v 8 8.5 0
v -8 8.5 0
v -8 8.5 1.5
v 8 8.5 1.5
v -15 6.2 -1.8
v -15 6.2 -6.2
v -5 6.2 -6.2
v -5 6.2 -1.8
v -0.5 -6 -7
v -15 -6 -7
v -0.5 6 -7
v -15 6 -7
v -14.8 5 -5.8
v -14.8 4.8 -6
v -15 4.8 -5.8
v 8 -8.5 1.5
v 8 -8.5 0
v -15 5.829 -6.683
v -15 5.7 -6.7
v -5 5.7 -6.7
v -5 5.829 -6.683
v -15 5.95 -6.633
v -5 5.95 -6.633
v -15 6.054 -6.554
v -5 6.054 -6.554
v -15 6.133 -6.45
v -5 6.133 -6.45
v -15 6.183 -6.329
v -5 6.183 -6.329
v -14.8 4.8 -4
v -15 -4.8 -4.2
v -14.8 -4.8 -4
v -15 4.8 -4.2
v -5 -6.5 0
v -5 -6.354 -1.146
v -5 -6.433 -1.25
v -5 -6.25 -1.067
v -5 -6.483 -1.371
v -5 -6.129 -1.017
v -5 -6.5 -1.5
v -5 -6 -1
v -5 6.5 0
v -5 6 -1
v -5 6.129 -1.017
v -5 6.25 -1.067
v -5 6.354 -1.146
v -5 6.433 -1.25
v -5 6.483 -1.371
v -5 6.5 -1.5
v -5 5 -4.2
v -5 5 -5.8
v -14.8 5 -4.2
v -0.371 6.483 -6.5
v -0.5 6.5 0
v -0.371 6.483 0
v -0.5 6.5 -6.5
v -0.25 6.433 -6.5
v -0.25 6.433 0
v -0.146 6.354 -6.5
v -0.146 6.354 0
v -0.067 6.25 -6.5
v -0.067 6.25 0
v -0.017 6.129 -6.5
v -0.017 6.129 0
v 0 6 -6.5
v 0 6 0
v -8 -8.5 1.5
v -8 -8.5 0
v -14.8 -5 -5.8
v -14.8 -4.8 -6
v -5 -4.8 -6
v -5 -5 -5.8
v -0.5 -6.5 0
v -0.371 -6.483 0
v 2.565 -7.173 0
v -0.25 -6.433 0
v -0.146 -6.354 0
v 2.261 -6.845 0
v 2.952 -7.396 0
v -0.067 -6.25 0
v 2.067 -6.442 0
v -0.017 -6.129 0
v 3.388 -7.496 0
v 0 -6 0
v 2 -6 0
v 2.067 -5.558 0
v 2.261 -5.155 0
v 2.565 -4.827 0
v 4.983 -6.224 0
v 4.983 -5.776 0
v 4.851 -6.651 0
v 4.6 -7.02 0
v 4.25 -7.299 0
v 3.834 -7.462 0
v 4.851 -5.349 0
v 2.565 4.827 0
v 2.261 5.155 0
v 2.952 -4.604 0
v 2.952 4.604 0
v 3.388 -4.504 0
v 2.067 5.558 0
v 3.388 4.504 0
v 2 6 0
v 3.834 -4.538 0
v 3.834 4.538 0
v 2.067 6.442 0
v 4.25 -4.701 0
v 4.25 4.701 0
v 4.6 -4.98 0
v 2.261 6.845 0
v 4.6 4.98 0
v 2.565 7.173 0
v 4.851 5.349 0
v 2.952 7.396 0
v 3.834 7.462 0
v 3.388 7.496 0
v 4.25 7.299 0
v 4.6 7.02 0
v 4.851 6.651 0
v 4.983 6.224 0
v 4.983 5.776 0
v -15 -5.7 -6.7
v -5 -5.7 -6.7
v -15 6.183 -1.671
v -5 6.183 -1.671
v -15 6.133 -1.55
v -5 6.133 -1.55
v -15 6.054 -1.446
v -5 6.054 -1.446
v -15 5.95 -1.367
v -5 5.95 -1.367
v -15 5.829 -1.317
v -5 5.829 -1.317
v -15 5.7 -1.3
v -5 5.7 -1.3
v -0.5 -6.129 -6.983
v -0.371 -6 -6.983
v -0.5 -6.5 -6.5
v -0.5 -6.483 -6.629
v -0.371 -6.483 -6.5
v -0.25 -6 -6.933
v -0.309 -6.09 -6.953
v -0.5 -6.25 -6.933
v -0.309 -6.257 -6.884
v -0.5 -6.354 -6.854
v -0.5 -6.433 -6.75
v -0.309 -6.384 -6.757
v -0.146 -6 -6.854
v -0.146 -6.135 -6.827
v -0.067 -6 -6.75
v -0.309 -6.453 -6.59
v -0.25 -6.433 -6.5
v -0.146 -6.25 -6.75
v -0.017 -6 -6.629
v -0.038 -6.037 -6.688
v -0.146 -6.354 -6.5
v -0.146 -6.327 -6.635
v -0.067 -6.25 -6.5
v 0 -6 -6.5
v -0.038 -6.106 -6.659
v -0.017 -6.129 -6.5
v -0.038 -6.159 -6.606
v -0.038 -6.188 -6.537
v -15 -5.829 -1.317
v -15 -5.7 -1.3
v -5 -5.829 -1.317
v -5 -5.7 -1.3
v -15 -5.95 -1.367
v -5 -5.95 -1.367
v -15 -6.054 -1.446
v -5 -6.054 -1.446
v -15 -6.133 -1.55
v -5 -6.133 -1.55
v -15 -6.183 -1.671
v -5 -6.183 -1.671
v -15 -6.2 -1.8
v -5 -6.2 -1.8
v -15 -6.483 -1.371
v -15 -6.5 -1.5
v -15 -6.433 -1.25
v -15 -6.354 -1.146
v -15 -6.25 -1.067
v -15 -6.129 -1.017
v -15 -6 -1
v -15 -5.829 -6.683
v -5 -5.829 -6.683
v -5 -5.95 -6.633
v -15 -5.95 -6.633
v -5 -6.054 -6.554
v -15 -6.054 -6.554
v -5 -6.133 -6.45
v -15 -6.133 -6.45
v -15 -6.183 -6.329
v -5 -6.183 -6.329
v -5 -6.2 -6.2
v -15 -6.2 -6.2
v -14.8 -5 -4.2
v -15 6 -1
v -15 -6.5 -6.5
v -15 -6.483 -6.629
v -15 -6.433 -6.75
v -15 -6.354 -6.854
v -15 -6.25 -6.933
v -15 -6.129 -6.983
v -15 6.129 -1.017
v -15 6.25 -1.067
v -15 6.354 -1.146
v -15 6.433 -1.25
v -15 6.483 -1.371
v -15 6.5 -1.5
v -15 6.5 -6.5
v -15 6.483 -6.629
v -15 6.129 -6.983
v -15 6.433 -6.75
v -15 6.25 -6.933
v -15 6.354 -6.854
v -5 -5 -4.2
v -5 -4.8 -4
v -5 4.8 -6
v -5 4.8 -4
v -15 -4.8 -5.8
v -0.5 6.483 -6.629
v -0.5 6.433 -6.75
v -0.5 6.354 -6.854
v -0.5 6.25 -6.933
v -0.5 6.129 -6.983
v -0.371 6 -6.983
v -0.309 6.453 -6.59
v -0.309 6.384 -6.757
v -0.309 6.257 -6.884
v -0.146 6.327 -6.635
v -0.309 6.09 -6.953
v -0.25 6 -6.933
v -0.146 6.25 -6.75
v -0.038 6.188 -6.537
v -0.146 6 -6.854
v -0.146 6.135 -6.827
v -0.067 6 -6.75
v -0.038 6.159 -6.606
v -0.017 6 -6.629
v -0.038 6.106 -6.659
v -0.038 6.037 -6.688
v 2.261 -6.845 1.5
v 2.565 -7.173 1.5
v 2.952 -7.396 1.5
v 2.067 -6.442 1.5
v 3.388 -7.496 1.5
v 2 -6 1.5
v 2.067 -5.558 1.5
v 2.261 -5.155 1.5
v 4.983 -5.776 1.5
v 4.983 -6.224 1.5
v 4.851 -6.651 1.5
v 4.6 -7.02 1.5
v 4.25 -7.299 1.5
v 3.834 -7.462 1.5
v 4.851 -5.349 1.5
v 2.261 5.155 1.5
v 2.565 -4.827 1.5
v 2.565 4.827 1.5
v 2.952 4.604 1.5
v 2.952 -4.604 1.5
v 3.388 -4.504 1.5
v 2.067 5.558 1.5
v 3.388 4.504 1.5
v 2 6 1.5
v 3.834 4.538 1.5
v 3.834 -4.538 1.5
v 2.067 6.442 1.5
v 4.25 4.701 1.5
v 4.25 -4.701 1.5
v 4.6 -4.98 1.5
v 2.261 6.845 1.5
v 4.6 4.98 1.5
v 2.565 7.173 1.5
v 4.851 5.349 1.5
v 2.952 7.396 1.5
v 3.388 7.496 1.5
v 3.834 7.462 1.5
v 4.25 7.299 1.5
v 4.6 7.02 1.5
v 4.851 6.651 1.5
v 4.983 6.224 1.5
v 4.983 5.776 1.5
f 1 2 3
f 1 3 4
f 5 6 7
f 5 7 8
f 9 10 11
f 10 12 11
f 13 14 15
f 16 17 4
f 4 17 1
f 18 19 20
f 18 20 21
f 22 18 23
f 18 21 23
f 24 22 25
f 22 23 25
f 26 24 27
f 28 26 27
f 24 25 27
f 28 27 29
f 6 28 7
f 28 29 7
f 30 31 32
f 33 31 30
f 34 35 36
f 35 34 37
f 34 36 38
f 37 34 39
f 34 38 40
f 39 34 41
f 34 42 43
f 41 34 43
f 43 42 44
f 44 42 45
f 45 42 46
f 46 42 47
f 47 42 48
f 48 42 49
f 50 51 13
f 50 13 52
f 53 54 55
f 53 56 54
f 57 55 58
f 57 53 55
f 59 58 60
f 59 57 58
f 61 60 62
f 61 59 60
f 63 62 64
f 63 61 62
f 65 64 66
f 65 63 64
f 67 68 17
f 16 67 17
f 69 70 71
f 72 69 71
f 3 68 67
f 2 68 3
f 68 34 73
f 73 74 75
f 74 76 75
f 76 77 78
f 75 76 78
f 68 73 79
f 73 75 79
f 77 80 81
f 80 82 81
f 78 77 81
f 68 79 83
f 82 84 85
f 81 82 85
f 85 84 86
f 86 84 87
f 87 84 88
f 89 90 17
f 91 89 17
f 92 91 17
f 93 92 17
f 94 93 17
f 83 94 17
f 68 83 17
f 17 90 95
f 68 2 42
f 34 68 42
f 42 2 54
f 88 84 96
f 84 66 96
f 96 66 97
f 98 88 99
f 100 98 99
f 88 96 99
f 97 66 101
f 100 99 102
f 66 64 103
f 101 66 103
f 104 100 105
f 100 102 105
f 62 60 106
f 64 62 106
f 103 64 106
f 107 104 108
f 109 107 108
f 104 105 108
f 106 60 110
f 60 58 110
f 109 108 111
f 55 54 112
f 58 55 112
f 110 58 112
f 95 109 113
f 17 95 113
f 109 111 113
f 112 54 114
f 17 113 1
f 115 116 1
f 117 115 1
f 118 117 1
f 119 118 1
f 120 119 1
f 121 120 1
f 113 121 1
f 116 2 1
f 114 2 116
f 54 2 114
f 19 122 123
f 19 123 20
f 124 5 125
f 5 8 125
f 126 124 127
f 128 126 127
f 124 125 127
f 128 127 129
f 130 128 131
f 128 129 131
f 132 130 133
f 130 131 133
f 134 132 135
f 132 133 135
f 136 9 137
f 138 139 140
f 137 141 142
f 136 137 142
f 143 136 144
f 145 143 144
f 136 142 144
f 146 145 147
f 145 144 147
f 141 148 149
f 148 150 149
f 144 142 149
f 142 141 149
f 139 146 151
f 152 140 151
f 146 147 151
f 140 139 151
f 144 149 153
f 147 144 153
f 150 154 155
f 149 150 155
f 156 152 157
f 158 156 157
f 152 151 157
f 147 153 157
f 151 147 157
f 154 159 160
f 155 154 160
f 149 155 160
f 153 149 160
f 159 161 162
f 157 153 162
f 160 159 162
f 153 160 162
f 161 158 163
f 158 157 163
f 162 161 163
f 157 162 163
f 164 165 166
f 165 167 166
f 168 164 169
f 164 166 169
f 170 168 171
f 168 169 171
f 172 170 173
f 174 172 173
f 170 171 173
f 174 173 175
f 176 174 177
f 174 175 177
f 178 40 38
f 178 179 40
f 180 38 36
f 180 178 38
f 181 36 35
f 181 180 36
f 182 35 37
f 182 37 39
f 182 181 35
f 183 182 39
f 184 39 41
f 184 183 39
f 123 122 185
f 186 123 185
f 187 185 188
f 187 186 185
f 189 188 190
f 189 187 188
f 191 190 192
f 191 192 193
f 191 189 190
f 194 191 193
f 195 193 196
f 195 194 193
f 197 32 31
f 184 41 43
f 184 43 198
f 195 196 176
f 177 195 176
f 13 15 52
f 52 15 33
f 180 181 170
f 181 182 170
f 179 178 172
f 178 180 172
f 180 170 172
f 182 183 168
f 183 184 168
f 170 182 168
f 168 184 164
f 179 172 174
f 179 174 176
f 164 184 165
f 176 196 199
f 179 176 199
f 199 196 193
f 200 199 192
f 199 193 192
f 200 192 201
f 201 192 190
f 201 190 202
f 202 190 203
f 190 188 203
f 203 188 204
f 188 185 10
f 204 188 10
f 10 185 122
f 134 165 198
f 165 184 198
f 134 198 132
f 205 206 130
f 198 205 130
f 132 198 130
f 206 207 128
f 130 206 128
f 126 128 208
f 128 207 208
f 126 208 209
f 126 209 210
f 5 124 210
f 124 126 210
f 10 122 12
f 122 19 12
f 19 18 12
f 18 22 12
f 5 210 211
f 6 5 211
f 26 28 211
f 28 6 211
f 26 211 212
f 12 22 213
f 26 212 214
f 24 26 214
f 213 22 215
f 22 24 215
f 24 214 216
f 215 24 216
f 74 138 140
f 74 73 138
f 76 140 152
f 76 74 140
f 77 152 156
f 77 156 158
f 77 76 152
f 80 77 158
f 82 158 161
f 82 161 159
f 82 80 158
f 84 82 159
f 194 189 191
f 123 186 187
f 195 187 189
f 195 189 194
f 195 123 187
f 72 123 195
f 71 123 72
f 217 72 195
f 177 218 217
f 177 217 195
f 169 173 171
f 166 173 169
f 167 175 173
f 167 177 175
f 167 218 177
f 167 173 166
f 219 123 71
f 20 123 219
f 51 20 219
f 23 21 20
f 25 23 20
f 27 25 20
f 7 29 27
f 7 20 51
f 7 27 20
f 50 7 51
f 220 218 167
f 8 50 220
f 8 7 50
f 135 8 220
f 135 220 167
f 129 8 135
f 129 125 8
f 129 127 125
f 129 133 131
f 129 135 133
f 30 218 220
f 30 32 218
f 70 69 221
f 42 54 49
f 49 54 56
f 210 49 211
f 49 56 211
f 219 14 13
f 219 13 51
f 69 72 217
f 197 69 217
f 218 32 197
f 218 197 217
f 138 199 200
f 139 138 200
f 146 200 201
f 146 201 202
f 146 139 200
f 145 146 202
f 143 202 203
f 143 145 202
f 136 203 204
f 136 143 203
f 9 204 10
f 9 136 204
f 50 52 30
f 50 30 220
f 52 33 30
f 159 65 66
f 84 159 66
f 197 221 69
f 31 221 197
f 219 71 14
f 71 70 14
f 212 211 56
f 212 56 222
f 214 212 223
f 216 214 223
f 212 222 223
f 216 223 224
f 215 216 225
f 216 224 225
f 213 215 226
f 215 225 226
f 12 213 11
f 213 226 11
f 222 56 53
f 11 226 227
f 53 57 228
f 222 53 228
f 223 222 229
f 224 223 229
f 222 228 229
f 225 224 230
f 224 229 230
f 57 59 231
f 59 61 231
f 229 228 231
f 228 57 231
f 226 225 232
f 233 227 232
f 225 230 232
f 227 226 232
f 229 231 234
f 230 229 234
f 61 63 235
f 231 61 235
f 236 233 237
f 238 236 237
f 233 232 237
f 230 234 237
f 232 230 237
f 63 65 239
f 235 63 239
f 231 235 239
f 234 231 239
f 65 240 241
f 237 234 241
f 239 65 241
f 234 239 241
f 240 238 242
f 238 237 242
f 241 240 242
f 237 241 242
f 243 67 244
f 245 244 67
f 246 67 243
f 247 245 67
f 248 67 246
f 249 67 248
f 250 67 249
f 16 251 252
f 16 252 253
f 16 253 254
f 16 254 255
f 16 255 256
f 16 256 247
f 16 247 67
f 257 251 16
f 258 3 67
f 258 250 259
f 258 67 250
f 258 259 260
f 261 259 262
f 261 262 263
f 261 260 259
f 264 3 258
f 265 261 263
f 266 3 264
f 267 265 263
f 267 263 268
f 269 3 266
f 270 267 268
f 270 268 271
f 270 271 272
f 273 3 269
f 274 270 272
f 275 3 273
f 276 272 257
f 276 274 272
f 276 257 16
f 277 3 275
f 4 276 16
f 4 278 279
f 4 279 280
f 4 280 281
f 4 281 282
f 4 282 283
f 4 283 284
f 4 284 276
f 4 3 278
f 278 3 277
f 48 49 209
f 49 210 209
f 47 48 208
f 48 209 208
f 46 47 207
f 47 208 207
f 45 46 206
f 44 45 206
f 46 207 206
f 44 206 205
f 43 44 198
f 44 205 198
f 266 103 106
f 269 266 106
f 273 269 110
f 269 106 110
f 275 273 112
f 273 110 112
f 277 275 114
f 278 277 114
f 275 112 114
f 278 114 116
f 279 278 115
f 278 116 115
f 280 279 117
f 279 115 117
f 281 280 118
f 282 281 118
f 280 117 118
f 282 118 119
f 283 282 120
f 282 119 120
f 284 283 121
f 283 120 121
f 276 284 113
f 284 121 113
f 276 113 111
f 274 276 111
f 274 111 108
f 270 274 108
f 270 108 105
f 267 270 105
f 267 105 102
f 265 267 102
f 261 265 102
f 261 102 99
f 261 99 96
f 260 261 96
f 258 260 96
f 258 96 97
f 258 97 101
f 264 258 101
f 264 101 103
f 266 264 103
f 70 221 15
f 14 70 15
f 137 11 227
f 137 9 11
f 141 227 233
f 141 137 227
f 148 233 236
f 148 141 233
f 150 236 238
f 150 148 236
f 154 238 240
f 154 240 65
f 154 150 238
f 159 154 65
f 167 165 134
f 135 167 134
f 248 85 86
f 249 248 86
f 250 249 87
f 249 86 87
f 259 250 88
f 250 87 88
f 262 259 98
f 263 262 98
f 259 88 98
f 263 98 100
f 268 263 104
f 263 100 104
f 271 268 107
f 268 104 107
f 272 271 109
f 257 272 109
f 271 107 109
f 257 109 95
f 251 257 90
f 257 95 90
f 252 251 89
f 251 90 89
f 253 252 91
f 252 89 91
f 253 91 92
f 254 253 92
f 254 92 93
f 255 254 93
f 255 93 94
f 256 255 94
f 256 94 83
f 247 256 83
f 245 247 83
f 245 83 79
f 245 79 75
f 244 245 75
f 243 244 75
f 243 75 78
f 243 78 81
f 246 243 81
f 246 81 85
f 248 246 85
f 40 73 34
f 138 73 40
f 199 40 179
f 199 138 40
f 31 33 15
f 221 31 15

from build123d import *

# Parameters (mm, degrees)
SKETCH1_W           = 16
SKETCH1_H           = 17
BOSS_EXTRUDE1_DEPTH = 1.5
BOSS_EXTRUDE2_DEPTH = 6.5
SKETCH3_W           = 5.4
SKETCH3_H           = 12.4
SKETCH3_W_2         = 2
SKETCH3_H_2         = 10
CUT_EXTRUDE1_DEPTH  = 10
FILLET1_R           = 0.5
FILLET2_R           = 0.5
CHAMFER1_SIZE       = 0.2
SKETCH4_R           = 1.5
CUT_EXTRUDE2_DEPTH  = 10


with BuildPart() as part:
    # Sketch1 → Boss-Extrude1 (new body)
    with BuildSketch(Plane.XY):
        Rectangle(SKETCH1_W, SKETCH1_H)
    extrude(amount=BOSS_EXTRUDE1_DEPTH)

    # Sketch2 → Boss-Extrude2 (add, symmetric)
    with BuildSketch(Plane(origin=(0, 0, 0), x_dir=(1, 0, 0), z_dir=(0, 1, 0))):
        Polygon((-5, 0), (-5, 1), (-15, 1), (-15, 7), (0, 7), (0, 0), align=None)
    extrude(amount=BOSS_EXTRUDE2_DEPTH, both=True)

    # Sketch3 → Cut-Extrude1 (cut)
    with BuildSketch(Plane.ZY.offset(15)):
        with Locations((-4, 0)):
            Rectangle(SKETCH3_W, SKETCH3_H)
        with Locations((-5, 0)):
            Rectangle(SKETCH3_W_2, SKETCH3_H_2, mode=Mode.SUBTRACT)
    extrude(amount=-CUT_EXTRUDE1_DEPTH, mode=Mode.SUBTRACT)

    # Fillet1
    fillet1_edges = [part.edges().sort_by_distance(p)[0] for p in [
        (-7.5, -6.5, -7),
        (-10, -6.5, -1),
        (-7.5, 6.5, -7),
        (-10, 6.5, -1),
        (-10, 6.2, -6.7),
        (-10, 6.2, -1.3),
        (-10, -6.2, -1.3),
        (-10, -6.2, -6.7),
    ]]
    fillet(fillet1_edges, radius=FILLET1_R)

    # Fillet2
    fillet2_edges = [part.edges().sort_by_distance(p)[0] for p in [
        (0, -6.5, -3.25),
        (0, 6.5, -3.25),
        (0, 0, -7),
        (0, 6.353553391, -6.853553391),
        (0, -6.353553391, -6.853553391),
    ]]
    fillet(fillet2_edges, radius=FILLET2_R)

    # Chamfer1
    chamfer1_edges = [part.edges().sort_by_distance(p)[0] for p in [
        (-15, 0, -4),
        (-10, -5, -4),
        (-15, -5, -5),
        (-10, -5, -6),
        (-15, 0, -6),
        (-10, 5, -6),
        (-15, 5, -5),
        (-10, 5, -4),
    ]]
    chamfer(chamfer1_edges, length=CHAMFER1_SIZE)

    # Sketch4 → Cut-Extrude2 (cut)
    with BuildSketch(Plane(origin=(0, 0, 0), x_dir=(-1, 0, 0), z_dir=(0, 0, -1))):
        with Locations((-3.5, 6)):
            Circle(SKETCH4_R)
        with Locations((-3.5, -6)):
            Circle(SKETCH4_R)
    extrude(amount=-CUT_EXTRUDE2_DEPTH, mode=Mode.SUBTRACT)


solid = part.part
